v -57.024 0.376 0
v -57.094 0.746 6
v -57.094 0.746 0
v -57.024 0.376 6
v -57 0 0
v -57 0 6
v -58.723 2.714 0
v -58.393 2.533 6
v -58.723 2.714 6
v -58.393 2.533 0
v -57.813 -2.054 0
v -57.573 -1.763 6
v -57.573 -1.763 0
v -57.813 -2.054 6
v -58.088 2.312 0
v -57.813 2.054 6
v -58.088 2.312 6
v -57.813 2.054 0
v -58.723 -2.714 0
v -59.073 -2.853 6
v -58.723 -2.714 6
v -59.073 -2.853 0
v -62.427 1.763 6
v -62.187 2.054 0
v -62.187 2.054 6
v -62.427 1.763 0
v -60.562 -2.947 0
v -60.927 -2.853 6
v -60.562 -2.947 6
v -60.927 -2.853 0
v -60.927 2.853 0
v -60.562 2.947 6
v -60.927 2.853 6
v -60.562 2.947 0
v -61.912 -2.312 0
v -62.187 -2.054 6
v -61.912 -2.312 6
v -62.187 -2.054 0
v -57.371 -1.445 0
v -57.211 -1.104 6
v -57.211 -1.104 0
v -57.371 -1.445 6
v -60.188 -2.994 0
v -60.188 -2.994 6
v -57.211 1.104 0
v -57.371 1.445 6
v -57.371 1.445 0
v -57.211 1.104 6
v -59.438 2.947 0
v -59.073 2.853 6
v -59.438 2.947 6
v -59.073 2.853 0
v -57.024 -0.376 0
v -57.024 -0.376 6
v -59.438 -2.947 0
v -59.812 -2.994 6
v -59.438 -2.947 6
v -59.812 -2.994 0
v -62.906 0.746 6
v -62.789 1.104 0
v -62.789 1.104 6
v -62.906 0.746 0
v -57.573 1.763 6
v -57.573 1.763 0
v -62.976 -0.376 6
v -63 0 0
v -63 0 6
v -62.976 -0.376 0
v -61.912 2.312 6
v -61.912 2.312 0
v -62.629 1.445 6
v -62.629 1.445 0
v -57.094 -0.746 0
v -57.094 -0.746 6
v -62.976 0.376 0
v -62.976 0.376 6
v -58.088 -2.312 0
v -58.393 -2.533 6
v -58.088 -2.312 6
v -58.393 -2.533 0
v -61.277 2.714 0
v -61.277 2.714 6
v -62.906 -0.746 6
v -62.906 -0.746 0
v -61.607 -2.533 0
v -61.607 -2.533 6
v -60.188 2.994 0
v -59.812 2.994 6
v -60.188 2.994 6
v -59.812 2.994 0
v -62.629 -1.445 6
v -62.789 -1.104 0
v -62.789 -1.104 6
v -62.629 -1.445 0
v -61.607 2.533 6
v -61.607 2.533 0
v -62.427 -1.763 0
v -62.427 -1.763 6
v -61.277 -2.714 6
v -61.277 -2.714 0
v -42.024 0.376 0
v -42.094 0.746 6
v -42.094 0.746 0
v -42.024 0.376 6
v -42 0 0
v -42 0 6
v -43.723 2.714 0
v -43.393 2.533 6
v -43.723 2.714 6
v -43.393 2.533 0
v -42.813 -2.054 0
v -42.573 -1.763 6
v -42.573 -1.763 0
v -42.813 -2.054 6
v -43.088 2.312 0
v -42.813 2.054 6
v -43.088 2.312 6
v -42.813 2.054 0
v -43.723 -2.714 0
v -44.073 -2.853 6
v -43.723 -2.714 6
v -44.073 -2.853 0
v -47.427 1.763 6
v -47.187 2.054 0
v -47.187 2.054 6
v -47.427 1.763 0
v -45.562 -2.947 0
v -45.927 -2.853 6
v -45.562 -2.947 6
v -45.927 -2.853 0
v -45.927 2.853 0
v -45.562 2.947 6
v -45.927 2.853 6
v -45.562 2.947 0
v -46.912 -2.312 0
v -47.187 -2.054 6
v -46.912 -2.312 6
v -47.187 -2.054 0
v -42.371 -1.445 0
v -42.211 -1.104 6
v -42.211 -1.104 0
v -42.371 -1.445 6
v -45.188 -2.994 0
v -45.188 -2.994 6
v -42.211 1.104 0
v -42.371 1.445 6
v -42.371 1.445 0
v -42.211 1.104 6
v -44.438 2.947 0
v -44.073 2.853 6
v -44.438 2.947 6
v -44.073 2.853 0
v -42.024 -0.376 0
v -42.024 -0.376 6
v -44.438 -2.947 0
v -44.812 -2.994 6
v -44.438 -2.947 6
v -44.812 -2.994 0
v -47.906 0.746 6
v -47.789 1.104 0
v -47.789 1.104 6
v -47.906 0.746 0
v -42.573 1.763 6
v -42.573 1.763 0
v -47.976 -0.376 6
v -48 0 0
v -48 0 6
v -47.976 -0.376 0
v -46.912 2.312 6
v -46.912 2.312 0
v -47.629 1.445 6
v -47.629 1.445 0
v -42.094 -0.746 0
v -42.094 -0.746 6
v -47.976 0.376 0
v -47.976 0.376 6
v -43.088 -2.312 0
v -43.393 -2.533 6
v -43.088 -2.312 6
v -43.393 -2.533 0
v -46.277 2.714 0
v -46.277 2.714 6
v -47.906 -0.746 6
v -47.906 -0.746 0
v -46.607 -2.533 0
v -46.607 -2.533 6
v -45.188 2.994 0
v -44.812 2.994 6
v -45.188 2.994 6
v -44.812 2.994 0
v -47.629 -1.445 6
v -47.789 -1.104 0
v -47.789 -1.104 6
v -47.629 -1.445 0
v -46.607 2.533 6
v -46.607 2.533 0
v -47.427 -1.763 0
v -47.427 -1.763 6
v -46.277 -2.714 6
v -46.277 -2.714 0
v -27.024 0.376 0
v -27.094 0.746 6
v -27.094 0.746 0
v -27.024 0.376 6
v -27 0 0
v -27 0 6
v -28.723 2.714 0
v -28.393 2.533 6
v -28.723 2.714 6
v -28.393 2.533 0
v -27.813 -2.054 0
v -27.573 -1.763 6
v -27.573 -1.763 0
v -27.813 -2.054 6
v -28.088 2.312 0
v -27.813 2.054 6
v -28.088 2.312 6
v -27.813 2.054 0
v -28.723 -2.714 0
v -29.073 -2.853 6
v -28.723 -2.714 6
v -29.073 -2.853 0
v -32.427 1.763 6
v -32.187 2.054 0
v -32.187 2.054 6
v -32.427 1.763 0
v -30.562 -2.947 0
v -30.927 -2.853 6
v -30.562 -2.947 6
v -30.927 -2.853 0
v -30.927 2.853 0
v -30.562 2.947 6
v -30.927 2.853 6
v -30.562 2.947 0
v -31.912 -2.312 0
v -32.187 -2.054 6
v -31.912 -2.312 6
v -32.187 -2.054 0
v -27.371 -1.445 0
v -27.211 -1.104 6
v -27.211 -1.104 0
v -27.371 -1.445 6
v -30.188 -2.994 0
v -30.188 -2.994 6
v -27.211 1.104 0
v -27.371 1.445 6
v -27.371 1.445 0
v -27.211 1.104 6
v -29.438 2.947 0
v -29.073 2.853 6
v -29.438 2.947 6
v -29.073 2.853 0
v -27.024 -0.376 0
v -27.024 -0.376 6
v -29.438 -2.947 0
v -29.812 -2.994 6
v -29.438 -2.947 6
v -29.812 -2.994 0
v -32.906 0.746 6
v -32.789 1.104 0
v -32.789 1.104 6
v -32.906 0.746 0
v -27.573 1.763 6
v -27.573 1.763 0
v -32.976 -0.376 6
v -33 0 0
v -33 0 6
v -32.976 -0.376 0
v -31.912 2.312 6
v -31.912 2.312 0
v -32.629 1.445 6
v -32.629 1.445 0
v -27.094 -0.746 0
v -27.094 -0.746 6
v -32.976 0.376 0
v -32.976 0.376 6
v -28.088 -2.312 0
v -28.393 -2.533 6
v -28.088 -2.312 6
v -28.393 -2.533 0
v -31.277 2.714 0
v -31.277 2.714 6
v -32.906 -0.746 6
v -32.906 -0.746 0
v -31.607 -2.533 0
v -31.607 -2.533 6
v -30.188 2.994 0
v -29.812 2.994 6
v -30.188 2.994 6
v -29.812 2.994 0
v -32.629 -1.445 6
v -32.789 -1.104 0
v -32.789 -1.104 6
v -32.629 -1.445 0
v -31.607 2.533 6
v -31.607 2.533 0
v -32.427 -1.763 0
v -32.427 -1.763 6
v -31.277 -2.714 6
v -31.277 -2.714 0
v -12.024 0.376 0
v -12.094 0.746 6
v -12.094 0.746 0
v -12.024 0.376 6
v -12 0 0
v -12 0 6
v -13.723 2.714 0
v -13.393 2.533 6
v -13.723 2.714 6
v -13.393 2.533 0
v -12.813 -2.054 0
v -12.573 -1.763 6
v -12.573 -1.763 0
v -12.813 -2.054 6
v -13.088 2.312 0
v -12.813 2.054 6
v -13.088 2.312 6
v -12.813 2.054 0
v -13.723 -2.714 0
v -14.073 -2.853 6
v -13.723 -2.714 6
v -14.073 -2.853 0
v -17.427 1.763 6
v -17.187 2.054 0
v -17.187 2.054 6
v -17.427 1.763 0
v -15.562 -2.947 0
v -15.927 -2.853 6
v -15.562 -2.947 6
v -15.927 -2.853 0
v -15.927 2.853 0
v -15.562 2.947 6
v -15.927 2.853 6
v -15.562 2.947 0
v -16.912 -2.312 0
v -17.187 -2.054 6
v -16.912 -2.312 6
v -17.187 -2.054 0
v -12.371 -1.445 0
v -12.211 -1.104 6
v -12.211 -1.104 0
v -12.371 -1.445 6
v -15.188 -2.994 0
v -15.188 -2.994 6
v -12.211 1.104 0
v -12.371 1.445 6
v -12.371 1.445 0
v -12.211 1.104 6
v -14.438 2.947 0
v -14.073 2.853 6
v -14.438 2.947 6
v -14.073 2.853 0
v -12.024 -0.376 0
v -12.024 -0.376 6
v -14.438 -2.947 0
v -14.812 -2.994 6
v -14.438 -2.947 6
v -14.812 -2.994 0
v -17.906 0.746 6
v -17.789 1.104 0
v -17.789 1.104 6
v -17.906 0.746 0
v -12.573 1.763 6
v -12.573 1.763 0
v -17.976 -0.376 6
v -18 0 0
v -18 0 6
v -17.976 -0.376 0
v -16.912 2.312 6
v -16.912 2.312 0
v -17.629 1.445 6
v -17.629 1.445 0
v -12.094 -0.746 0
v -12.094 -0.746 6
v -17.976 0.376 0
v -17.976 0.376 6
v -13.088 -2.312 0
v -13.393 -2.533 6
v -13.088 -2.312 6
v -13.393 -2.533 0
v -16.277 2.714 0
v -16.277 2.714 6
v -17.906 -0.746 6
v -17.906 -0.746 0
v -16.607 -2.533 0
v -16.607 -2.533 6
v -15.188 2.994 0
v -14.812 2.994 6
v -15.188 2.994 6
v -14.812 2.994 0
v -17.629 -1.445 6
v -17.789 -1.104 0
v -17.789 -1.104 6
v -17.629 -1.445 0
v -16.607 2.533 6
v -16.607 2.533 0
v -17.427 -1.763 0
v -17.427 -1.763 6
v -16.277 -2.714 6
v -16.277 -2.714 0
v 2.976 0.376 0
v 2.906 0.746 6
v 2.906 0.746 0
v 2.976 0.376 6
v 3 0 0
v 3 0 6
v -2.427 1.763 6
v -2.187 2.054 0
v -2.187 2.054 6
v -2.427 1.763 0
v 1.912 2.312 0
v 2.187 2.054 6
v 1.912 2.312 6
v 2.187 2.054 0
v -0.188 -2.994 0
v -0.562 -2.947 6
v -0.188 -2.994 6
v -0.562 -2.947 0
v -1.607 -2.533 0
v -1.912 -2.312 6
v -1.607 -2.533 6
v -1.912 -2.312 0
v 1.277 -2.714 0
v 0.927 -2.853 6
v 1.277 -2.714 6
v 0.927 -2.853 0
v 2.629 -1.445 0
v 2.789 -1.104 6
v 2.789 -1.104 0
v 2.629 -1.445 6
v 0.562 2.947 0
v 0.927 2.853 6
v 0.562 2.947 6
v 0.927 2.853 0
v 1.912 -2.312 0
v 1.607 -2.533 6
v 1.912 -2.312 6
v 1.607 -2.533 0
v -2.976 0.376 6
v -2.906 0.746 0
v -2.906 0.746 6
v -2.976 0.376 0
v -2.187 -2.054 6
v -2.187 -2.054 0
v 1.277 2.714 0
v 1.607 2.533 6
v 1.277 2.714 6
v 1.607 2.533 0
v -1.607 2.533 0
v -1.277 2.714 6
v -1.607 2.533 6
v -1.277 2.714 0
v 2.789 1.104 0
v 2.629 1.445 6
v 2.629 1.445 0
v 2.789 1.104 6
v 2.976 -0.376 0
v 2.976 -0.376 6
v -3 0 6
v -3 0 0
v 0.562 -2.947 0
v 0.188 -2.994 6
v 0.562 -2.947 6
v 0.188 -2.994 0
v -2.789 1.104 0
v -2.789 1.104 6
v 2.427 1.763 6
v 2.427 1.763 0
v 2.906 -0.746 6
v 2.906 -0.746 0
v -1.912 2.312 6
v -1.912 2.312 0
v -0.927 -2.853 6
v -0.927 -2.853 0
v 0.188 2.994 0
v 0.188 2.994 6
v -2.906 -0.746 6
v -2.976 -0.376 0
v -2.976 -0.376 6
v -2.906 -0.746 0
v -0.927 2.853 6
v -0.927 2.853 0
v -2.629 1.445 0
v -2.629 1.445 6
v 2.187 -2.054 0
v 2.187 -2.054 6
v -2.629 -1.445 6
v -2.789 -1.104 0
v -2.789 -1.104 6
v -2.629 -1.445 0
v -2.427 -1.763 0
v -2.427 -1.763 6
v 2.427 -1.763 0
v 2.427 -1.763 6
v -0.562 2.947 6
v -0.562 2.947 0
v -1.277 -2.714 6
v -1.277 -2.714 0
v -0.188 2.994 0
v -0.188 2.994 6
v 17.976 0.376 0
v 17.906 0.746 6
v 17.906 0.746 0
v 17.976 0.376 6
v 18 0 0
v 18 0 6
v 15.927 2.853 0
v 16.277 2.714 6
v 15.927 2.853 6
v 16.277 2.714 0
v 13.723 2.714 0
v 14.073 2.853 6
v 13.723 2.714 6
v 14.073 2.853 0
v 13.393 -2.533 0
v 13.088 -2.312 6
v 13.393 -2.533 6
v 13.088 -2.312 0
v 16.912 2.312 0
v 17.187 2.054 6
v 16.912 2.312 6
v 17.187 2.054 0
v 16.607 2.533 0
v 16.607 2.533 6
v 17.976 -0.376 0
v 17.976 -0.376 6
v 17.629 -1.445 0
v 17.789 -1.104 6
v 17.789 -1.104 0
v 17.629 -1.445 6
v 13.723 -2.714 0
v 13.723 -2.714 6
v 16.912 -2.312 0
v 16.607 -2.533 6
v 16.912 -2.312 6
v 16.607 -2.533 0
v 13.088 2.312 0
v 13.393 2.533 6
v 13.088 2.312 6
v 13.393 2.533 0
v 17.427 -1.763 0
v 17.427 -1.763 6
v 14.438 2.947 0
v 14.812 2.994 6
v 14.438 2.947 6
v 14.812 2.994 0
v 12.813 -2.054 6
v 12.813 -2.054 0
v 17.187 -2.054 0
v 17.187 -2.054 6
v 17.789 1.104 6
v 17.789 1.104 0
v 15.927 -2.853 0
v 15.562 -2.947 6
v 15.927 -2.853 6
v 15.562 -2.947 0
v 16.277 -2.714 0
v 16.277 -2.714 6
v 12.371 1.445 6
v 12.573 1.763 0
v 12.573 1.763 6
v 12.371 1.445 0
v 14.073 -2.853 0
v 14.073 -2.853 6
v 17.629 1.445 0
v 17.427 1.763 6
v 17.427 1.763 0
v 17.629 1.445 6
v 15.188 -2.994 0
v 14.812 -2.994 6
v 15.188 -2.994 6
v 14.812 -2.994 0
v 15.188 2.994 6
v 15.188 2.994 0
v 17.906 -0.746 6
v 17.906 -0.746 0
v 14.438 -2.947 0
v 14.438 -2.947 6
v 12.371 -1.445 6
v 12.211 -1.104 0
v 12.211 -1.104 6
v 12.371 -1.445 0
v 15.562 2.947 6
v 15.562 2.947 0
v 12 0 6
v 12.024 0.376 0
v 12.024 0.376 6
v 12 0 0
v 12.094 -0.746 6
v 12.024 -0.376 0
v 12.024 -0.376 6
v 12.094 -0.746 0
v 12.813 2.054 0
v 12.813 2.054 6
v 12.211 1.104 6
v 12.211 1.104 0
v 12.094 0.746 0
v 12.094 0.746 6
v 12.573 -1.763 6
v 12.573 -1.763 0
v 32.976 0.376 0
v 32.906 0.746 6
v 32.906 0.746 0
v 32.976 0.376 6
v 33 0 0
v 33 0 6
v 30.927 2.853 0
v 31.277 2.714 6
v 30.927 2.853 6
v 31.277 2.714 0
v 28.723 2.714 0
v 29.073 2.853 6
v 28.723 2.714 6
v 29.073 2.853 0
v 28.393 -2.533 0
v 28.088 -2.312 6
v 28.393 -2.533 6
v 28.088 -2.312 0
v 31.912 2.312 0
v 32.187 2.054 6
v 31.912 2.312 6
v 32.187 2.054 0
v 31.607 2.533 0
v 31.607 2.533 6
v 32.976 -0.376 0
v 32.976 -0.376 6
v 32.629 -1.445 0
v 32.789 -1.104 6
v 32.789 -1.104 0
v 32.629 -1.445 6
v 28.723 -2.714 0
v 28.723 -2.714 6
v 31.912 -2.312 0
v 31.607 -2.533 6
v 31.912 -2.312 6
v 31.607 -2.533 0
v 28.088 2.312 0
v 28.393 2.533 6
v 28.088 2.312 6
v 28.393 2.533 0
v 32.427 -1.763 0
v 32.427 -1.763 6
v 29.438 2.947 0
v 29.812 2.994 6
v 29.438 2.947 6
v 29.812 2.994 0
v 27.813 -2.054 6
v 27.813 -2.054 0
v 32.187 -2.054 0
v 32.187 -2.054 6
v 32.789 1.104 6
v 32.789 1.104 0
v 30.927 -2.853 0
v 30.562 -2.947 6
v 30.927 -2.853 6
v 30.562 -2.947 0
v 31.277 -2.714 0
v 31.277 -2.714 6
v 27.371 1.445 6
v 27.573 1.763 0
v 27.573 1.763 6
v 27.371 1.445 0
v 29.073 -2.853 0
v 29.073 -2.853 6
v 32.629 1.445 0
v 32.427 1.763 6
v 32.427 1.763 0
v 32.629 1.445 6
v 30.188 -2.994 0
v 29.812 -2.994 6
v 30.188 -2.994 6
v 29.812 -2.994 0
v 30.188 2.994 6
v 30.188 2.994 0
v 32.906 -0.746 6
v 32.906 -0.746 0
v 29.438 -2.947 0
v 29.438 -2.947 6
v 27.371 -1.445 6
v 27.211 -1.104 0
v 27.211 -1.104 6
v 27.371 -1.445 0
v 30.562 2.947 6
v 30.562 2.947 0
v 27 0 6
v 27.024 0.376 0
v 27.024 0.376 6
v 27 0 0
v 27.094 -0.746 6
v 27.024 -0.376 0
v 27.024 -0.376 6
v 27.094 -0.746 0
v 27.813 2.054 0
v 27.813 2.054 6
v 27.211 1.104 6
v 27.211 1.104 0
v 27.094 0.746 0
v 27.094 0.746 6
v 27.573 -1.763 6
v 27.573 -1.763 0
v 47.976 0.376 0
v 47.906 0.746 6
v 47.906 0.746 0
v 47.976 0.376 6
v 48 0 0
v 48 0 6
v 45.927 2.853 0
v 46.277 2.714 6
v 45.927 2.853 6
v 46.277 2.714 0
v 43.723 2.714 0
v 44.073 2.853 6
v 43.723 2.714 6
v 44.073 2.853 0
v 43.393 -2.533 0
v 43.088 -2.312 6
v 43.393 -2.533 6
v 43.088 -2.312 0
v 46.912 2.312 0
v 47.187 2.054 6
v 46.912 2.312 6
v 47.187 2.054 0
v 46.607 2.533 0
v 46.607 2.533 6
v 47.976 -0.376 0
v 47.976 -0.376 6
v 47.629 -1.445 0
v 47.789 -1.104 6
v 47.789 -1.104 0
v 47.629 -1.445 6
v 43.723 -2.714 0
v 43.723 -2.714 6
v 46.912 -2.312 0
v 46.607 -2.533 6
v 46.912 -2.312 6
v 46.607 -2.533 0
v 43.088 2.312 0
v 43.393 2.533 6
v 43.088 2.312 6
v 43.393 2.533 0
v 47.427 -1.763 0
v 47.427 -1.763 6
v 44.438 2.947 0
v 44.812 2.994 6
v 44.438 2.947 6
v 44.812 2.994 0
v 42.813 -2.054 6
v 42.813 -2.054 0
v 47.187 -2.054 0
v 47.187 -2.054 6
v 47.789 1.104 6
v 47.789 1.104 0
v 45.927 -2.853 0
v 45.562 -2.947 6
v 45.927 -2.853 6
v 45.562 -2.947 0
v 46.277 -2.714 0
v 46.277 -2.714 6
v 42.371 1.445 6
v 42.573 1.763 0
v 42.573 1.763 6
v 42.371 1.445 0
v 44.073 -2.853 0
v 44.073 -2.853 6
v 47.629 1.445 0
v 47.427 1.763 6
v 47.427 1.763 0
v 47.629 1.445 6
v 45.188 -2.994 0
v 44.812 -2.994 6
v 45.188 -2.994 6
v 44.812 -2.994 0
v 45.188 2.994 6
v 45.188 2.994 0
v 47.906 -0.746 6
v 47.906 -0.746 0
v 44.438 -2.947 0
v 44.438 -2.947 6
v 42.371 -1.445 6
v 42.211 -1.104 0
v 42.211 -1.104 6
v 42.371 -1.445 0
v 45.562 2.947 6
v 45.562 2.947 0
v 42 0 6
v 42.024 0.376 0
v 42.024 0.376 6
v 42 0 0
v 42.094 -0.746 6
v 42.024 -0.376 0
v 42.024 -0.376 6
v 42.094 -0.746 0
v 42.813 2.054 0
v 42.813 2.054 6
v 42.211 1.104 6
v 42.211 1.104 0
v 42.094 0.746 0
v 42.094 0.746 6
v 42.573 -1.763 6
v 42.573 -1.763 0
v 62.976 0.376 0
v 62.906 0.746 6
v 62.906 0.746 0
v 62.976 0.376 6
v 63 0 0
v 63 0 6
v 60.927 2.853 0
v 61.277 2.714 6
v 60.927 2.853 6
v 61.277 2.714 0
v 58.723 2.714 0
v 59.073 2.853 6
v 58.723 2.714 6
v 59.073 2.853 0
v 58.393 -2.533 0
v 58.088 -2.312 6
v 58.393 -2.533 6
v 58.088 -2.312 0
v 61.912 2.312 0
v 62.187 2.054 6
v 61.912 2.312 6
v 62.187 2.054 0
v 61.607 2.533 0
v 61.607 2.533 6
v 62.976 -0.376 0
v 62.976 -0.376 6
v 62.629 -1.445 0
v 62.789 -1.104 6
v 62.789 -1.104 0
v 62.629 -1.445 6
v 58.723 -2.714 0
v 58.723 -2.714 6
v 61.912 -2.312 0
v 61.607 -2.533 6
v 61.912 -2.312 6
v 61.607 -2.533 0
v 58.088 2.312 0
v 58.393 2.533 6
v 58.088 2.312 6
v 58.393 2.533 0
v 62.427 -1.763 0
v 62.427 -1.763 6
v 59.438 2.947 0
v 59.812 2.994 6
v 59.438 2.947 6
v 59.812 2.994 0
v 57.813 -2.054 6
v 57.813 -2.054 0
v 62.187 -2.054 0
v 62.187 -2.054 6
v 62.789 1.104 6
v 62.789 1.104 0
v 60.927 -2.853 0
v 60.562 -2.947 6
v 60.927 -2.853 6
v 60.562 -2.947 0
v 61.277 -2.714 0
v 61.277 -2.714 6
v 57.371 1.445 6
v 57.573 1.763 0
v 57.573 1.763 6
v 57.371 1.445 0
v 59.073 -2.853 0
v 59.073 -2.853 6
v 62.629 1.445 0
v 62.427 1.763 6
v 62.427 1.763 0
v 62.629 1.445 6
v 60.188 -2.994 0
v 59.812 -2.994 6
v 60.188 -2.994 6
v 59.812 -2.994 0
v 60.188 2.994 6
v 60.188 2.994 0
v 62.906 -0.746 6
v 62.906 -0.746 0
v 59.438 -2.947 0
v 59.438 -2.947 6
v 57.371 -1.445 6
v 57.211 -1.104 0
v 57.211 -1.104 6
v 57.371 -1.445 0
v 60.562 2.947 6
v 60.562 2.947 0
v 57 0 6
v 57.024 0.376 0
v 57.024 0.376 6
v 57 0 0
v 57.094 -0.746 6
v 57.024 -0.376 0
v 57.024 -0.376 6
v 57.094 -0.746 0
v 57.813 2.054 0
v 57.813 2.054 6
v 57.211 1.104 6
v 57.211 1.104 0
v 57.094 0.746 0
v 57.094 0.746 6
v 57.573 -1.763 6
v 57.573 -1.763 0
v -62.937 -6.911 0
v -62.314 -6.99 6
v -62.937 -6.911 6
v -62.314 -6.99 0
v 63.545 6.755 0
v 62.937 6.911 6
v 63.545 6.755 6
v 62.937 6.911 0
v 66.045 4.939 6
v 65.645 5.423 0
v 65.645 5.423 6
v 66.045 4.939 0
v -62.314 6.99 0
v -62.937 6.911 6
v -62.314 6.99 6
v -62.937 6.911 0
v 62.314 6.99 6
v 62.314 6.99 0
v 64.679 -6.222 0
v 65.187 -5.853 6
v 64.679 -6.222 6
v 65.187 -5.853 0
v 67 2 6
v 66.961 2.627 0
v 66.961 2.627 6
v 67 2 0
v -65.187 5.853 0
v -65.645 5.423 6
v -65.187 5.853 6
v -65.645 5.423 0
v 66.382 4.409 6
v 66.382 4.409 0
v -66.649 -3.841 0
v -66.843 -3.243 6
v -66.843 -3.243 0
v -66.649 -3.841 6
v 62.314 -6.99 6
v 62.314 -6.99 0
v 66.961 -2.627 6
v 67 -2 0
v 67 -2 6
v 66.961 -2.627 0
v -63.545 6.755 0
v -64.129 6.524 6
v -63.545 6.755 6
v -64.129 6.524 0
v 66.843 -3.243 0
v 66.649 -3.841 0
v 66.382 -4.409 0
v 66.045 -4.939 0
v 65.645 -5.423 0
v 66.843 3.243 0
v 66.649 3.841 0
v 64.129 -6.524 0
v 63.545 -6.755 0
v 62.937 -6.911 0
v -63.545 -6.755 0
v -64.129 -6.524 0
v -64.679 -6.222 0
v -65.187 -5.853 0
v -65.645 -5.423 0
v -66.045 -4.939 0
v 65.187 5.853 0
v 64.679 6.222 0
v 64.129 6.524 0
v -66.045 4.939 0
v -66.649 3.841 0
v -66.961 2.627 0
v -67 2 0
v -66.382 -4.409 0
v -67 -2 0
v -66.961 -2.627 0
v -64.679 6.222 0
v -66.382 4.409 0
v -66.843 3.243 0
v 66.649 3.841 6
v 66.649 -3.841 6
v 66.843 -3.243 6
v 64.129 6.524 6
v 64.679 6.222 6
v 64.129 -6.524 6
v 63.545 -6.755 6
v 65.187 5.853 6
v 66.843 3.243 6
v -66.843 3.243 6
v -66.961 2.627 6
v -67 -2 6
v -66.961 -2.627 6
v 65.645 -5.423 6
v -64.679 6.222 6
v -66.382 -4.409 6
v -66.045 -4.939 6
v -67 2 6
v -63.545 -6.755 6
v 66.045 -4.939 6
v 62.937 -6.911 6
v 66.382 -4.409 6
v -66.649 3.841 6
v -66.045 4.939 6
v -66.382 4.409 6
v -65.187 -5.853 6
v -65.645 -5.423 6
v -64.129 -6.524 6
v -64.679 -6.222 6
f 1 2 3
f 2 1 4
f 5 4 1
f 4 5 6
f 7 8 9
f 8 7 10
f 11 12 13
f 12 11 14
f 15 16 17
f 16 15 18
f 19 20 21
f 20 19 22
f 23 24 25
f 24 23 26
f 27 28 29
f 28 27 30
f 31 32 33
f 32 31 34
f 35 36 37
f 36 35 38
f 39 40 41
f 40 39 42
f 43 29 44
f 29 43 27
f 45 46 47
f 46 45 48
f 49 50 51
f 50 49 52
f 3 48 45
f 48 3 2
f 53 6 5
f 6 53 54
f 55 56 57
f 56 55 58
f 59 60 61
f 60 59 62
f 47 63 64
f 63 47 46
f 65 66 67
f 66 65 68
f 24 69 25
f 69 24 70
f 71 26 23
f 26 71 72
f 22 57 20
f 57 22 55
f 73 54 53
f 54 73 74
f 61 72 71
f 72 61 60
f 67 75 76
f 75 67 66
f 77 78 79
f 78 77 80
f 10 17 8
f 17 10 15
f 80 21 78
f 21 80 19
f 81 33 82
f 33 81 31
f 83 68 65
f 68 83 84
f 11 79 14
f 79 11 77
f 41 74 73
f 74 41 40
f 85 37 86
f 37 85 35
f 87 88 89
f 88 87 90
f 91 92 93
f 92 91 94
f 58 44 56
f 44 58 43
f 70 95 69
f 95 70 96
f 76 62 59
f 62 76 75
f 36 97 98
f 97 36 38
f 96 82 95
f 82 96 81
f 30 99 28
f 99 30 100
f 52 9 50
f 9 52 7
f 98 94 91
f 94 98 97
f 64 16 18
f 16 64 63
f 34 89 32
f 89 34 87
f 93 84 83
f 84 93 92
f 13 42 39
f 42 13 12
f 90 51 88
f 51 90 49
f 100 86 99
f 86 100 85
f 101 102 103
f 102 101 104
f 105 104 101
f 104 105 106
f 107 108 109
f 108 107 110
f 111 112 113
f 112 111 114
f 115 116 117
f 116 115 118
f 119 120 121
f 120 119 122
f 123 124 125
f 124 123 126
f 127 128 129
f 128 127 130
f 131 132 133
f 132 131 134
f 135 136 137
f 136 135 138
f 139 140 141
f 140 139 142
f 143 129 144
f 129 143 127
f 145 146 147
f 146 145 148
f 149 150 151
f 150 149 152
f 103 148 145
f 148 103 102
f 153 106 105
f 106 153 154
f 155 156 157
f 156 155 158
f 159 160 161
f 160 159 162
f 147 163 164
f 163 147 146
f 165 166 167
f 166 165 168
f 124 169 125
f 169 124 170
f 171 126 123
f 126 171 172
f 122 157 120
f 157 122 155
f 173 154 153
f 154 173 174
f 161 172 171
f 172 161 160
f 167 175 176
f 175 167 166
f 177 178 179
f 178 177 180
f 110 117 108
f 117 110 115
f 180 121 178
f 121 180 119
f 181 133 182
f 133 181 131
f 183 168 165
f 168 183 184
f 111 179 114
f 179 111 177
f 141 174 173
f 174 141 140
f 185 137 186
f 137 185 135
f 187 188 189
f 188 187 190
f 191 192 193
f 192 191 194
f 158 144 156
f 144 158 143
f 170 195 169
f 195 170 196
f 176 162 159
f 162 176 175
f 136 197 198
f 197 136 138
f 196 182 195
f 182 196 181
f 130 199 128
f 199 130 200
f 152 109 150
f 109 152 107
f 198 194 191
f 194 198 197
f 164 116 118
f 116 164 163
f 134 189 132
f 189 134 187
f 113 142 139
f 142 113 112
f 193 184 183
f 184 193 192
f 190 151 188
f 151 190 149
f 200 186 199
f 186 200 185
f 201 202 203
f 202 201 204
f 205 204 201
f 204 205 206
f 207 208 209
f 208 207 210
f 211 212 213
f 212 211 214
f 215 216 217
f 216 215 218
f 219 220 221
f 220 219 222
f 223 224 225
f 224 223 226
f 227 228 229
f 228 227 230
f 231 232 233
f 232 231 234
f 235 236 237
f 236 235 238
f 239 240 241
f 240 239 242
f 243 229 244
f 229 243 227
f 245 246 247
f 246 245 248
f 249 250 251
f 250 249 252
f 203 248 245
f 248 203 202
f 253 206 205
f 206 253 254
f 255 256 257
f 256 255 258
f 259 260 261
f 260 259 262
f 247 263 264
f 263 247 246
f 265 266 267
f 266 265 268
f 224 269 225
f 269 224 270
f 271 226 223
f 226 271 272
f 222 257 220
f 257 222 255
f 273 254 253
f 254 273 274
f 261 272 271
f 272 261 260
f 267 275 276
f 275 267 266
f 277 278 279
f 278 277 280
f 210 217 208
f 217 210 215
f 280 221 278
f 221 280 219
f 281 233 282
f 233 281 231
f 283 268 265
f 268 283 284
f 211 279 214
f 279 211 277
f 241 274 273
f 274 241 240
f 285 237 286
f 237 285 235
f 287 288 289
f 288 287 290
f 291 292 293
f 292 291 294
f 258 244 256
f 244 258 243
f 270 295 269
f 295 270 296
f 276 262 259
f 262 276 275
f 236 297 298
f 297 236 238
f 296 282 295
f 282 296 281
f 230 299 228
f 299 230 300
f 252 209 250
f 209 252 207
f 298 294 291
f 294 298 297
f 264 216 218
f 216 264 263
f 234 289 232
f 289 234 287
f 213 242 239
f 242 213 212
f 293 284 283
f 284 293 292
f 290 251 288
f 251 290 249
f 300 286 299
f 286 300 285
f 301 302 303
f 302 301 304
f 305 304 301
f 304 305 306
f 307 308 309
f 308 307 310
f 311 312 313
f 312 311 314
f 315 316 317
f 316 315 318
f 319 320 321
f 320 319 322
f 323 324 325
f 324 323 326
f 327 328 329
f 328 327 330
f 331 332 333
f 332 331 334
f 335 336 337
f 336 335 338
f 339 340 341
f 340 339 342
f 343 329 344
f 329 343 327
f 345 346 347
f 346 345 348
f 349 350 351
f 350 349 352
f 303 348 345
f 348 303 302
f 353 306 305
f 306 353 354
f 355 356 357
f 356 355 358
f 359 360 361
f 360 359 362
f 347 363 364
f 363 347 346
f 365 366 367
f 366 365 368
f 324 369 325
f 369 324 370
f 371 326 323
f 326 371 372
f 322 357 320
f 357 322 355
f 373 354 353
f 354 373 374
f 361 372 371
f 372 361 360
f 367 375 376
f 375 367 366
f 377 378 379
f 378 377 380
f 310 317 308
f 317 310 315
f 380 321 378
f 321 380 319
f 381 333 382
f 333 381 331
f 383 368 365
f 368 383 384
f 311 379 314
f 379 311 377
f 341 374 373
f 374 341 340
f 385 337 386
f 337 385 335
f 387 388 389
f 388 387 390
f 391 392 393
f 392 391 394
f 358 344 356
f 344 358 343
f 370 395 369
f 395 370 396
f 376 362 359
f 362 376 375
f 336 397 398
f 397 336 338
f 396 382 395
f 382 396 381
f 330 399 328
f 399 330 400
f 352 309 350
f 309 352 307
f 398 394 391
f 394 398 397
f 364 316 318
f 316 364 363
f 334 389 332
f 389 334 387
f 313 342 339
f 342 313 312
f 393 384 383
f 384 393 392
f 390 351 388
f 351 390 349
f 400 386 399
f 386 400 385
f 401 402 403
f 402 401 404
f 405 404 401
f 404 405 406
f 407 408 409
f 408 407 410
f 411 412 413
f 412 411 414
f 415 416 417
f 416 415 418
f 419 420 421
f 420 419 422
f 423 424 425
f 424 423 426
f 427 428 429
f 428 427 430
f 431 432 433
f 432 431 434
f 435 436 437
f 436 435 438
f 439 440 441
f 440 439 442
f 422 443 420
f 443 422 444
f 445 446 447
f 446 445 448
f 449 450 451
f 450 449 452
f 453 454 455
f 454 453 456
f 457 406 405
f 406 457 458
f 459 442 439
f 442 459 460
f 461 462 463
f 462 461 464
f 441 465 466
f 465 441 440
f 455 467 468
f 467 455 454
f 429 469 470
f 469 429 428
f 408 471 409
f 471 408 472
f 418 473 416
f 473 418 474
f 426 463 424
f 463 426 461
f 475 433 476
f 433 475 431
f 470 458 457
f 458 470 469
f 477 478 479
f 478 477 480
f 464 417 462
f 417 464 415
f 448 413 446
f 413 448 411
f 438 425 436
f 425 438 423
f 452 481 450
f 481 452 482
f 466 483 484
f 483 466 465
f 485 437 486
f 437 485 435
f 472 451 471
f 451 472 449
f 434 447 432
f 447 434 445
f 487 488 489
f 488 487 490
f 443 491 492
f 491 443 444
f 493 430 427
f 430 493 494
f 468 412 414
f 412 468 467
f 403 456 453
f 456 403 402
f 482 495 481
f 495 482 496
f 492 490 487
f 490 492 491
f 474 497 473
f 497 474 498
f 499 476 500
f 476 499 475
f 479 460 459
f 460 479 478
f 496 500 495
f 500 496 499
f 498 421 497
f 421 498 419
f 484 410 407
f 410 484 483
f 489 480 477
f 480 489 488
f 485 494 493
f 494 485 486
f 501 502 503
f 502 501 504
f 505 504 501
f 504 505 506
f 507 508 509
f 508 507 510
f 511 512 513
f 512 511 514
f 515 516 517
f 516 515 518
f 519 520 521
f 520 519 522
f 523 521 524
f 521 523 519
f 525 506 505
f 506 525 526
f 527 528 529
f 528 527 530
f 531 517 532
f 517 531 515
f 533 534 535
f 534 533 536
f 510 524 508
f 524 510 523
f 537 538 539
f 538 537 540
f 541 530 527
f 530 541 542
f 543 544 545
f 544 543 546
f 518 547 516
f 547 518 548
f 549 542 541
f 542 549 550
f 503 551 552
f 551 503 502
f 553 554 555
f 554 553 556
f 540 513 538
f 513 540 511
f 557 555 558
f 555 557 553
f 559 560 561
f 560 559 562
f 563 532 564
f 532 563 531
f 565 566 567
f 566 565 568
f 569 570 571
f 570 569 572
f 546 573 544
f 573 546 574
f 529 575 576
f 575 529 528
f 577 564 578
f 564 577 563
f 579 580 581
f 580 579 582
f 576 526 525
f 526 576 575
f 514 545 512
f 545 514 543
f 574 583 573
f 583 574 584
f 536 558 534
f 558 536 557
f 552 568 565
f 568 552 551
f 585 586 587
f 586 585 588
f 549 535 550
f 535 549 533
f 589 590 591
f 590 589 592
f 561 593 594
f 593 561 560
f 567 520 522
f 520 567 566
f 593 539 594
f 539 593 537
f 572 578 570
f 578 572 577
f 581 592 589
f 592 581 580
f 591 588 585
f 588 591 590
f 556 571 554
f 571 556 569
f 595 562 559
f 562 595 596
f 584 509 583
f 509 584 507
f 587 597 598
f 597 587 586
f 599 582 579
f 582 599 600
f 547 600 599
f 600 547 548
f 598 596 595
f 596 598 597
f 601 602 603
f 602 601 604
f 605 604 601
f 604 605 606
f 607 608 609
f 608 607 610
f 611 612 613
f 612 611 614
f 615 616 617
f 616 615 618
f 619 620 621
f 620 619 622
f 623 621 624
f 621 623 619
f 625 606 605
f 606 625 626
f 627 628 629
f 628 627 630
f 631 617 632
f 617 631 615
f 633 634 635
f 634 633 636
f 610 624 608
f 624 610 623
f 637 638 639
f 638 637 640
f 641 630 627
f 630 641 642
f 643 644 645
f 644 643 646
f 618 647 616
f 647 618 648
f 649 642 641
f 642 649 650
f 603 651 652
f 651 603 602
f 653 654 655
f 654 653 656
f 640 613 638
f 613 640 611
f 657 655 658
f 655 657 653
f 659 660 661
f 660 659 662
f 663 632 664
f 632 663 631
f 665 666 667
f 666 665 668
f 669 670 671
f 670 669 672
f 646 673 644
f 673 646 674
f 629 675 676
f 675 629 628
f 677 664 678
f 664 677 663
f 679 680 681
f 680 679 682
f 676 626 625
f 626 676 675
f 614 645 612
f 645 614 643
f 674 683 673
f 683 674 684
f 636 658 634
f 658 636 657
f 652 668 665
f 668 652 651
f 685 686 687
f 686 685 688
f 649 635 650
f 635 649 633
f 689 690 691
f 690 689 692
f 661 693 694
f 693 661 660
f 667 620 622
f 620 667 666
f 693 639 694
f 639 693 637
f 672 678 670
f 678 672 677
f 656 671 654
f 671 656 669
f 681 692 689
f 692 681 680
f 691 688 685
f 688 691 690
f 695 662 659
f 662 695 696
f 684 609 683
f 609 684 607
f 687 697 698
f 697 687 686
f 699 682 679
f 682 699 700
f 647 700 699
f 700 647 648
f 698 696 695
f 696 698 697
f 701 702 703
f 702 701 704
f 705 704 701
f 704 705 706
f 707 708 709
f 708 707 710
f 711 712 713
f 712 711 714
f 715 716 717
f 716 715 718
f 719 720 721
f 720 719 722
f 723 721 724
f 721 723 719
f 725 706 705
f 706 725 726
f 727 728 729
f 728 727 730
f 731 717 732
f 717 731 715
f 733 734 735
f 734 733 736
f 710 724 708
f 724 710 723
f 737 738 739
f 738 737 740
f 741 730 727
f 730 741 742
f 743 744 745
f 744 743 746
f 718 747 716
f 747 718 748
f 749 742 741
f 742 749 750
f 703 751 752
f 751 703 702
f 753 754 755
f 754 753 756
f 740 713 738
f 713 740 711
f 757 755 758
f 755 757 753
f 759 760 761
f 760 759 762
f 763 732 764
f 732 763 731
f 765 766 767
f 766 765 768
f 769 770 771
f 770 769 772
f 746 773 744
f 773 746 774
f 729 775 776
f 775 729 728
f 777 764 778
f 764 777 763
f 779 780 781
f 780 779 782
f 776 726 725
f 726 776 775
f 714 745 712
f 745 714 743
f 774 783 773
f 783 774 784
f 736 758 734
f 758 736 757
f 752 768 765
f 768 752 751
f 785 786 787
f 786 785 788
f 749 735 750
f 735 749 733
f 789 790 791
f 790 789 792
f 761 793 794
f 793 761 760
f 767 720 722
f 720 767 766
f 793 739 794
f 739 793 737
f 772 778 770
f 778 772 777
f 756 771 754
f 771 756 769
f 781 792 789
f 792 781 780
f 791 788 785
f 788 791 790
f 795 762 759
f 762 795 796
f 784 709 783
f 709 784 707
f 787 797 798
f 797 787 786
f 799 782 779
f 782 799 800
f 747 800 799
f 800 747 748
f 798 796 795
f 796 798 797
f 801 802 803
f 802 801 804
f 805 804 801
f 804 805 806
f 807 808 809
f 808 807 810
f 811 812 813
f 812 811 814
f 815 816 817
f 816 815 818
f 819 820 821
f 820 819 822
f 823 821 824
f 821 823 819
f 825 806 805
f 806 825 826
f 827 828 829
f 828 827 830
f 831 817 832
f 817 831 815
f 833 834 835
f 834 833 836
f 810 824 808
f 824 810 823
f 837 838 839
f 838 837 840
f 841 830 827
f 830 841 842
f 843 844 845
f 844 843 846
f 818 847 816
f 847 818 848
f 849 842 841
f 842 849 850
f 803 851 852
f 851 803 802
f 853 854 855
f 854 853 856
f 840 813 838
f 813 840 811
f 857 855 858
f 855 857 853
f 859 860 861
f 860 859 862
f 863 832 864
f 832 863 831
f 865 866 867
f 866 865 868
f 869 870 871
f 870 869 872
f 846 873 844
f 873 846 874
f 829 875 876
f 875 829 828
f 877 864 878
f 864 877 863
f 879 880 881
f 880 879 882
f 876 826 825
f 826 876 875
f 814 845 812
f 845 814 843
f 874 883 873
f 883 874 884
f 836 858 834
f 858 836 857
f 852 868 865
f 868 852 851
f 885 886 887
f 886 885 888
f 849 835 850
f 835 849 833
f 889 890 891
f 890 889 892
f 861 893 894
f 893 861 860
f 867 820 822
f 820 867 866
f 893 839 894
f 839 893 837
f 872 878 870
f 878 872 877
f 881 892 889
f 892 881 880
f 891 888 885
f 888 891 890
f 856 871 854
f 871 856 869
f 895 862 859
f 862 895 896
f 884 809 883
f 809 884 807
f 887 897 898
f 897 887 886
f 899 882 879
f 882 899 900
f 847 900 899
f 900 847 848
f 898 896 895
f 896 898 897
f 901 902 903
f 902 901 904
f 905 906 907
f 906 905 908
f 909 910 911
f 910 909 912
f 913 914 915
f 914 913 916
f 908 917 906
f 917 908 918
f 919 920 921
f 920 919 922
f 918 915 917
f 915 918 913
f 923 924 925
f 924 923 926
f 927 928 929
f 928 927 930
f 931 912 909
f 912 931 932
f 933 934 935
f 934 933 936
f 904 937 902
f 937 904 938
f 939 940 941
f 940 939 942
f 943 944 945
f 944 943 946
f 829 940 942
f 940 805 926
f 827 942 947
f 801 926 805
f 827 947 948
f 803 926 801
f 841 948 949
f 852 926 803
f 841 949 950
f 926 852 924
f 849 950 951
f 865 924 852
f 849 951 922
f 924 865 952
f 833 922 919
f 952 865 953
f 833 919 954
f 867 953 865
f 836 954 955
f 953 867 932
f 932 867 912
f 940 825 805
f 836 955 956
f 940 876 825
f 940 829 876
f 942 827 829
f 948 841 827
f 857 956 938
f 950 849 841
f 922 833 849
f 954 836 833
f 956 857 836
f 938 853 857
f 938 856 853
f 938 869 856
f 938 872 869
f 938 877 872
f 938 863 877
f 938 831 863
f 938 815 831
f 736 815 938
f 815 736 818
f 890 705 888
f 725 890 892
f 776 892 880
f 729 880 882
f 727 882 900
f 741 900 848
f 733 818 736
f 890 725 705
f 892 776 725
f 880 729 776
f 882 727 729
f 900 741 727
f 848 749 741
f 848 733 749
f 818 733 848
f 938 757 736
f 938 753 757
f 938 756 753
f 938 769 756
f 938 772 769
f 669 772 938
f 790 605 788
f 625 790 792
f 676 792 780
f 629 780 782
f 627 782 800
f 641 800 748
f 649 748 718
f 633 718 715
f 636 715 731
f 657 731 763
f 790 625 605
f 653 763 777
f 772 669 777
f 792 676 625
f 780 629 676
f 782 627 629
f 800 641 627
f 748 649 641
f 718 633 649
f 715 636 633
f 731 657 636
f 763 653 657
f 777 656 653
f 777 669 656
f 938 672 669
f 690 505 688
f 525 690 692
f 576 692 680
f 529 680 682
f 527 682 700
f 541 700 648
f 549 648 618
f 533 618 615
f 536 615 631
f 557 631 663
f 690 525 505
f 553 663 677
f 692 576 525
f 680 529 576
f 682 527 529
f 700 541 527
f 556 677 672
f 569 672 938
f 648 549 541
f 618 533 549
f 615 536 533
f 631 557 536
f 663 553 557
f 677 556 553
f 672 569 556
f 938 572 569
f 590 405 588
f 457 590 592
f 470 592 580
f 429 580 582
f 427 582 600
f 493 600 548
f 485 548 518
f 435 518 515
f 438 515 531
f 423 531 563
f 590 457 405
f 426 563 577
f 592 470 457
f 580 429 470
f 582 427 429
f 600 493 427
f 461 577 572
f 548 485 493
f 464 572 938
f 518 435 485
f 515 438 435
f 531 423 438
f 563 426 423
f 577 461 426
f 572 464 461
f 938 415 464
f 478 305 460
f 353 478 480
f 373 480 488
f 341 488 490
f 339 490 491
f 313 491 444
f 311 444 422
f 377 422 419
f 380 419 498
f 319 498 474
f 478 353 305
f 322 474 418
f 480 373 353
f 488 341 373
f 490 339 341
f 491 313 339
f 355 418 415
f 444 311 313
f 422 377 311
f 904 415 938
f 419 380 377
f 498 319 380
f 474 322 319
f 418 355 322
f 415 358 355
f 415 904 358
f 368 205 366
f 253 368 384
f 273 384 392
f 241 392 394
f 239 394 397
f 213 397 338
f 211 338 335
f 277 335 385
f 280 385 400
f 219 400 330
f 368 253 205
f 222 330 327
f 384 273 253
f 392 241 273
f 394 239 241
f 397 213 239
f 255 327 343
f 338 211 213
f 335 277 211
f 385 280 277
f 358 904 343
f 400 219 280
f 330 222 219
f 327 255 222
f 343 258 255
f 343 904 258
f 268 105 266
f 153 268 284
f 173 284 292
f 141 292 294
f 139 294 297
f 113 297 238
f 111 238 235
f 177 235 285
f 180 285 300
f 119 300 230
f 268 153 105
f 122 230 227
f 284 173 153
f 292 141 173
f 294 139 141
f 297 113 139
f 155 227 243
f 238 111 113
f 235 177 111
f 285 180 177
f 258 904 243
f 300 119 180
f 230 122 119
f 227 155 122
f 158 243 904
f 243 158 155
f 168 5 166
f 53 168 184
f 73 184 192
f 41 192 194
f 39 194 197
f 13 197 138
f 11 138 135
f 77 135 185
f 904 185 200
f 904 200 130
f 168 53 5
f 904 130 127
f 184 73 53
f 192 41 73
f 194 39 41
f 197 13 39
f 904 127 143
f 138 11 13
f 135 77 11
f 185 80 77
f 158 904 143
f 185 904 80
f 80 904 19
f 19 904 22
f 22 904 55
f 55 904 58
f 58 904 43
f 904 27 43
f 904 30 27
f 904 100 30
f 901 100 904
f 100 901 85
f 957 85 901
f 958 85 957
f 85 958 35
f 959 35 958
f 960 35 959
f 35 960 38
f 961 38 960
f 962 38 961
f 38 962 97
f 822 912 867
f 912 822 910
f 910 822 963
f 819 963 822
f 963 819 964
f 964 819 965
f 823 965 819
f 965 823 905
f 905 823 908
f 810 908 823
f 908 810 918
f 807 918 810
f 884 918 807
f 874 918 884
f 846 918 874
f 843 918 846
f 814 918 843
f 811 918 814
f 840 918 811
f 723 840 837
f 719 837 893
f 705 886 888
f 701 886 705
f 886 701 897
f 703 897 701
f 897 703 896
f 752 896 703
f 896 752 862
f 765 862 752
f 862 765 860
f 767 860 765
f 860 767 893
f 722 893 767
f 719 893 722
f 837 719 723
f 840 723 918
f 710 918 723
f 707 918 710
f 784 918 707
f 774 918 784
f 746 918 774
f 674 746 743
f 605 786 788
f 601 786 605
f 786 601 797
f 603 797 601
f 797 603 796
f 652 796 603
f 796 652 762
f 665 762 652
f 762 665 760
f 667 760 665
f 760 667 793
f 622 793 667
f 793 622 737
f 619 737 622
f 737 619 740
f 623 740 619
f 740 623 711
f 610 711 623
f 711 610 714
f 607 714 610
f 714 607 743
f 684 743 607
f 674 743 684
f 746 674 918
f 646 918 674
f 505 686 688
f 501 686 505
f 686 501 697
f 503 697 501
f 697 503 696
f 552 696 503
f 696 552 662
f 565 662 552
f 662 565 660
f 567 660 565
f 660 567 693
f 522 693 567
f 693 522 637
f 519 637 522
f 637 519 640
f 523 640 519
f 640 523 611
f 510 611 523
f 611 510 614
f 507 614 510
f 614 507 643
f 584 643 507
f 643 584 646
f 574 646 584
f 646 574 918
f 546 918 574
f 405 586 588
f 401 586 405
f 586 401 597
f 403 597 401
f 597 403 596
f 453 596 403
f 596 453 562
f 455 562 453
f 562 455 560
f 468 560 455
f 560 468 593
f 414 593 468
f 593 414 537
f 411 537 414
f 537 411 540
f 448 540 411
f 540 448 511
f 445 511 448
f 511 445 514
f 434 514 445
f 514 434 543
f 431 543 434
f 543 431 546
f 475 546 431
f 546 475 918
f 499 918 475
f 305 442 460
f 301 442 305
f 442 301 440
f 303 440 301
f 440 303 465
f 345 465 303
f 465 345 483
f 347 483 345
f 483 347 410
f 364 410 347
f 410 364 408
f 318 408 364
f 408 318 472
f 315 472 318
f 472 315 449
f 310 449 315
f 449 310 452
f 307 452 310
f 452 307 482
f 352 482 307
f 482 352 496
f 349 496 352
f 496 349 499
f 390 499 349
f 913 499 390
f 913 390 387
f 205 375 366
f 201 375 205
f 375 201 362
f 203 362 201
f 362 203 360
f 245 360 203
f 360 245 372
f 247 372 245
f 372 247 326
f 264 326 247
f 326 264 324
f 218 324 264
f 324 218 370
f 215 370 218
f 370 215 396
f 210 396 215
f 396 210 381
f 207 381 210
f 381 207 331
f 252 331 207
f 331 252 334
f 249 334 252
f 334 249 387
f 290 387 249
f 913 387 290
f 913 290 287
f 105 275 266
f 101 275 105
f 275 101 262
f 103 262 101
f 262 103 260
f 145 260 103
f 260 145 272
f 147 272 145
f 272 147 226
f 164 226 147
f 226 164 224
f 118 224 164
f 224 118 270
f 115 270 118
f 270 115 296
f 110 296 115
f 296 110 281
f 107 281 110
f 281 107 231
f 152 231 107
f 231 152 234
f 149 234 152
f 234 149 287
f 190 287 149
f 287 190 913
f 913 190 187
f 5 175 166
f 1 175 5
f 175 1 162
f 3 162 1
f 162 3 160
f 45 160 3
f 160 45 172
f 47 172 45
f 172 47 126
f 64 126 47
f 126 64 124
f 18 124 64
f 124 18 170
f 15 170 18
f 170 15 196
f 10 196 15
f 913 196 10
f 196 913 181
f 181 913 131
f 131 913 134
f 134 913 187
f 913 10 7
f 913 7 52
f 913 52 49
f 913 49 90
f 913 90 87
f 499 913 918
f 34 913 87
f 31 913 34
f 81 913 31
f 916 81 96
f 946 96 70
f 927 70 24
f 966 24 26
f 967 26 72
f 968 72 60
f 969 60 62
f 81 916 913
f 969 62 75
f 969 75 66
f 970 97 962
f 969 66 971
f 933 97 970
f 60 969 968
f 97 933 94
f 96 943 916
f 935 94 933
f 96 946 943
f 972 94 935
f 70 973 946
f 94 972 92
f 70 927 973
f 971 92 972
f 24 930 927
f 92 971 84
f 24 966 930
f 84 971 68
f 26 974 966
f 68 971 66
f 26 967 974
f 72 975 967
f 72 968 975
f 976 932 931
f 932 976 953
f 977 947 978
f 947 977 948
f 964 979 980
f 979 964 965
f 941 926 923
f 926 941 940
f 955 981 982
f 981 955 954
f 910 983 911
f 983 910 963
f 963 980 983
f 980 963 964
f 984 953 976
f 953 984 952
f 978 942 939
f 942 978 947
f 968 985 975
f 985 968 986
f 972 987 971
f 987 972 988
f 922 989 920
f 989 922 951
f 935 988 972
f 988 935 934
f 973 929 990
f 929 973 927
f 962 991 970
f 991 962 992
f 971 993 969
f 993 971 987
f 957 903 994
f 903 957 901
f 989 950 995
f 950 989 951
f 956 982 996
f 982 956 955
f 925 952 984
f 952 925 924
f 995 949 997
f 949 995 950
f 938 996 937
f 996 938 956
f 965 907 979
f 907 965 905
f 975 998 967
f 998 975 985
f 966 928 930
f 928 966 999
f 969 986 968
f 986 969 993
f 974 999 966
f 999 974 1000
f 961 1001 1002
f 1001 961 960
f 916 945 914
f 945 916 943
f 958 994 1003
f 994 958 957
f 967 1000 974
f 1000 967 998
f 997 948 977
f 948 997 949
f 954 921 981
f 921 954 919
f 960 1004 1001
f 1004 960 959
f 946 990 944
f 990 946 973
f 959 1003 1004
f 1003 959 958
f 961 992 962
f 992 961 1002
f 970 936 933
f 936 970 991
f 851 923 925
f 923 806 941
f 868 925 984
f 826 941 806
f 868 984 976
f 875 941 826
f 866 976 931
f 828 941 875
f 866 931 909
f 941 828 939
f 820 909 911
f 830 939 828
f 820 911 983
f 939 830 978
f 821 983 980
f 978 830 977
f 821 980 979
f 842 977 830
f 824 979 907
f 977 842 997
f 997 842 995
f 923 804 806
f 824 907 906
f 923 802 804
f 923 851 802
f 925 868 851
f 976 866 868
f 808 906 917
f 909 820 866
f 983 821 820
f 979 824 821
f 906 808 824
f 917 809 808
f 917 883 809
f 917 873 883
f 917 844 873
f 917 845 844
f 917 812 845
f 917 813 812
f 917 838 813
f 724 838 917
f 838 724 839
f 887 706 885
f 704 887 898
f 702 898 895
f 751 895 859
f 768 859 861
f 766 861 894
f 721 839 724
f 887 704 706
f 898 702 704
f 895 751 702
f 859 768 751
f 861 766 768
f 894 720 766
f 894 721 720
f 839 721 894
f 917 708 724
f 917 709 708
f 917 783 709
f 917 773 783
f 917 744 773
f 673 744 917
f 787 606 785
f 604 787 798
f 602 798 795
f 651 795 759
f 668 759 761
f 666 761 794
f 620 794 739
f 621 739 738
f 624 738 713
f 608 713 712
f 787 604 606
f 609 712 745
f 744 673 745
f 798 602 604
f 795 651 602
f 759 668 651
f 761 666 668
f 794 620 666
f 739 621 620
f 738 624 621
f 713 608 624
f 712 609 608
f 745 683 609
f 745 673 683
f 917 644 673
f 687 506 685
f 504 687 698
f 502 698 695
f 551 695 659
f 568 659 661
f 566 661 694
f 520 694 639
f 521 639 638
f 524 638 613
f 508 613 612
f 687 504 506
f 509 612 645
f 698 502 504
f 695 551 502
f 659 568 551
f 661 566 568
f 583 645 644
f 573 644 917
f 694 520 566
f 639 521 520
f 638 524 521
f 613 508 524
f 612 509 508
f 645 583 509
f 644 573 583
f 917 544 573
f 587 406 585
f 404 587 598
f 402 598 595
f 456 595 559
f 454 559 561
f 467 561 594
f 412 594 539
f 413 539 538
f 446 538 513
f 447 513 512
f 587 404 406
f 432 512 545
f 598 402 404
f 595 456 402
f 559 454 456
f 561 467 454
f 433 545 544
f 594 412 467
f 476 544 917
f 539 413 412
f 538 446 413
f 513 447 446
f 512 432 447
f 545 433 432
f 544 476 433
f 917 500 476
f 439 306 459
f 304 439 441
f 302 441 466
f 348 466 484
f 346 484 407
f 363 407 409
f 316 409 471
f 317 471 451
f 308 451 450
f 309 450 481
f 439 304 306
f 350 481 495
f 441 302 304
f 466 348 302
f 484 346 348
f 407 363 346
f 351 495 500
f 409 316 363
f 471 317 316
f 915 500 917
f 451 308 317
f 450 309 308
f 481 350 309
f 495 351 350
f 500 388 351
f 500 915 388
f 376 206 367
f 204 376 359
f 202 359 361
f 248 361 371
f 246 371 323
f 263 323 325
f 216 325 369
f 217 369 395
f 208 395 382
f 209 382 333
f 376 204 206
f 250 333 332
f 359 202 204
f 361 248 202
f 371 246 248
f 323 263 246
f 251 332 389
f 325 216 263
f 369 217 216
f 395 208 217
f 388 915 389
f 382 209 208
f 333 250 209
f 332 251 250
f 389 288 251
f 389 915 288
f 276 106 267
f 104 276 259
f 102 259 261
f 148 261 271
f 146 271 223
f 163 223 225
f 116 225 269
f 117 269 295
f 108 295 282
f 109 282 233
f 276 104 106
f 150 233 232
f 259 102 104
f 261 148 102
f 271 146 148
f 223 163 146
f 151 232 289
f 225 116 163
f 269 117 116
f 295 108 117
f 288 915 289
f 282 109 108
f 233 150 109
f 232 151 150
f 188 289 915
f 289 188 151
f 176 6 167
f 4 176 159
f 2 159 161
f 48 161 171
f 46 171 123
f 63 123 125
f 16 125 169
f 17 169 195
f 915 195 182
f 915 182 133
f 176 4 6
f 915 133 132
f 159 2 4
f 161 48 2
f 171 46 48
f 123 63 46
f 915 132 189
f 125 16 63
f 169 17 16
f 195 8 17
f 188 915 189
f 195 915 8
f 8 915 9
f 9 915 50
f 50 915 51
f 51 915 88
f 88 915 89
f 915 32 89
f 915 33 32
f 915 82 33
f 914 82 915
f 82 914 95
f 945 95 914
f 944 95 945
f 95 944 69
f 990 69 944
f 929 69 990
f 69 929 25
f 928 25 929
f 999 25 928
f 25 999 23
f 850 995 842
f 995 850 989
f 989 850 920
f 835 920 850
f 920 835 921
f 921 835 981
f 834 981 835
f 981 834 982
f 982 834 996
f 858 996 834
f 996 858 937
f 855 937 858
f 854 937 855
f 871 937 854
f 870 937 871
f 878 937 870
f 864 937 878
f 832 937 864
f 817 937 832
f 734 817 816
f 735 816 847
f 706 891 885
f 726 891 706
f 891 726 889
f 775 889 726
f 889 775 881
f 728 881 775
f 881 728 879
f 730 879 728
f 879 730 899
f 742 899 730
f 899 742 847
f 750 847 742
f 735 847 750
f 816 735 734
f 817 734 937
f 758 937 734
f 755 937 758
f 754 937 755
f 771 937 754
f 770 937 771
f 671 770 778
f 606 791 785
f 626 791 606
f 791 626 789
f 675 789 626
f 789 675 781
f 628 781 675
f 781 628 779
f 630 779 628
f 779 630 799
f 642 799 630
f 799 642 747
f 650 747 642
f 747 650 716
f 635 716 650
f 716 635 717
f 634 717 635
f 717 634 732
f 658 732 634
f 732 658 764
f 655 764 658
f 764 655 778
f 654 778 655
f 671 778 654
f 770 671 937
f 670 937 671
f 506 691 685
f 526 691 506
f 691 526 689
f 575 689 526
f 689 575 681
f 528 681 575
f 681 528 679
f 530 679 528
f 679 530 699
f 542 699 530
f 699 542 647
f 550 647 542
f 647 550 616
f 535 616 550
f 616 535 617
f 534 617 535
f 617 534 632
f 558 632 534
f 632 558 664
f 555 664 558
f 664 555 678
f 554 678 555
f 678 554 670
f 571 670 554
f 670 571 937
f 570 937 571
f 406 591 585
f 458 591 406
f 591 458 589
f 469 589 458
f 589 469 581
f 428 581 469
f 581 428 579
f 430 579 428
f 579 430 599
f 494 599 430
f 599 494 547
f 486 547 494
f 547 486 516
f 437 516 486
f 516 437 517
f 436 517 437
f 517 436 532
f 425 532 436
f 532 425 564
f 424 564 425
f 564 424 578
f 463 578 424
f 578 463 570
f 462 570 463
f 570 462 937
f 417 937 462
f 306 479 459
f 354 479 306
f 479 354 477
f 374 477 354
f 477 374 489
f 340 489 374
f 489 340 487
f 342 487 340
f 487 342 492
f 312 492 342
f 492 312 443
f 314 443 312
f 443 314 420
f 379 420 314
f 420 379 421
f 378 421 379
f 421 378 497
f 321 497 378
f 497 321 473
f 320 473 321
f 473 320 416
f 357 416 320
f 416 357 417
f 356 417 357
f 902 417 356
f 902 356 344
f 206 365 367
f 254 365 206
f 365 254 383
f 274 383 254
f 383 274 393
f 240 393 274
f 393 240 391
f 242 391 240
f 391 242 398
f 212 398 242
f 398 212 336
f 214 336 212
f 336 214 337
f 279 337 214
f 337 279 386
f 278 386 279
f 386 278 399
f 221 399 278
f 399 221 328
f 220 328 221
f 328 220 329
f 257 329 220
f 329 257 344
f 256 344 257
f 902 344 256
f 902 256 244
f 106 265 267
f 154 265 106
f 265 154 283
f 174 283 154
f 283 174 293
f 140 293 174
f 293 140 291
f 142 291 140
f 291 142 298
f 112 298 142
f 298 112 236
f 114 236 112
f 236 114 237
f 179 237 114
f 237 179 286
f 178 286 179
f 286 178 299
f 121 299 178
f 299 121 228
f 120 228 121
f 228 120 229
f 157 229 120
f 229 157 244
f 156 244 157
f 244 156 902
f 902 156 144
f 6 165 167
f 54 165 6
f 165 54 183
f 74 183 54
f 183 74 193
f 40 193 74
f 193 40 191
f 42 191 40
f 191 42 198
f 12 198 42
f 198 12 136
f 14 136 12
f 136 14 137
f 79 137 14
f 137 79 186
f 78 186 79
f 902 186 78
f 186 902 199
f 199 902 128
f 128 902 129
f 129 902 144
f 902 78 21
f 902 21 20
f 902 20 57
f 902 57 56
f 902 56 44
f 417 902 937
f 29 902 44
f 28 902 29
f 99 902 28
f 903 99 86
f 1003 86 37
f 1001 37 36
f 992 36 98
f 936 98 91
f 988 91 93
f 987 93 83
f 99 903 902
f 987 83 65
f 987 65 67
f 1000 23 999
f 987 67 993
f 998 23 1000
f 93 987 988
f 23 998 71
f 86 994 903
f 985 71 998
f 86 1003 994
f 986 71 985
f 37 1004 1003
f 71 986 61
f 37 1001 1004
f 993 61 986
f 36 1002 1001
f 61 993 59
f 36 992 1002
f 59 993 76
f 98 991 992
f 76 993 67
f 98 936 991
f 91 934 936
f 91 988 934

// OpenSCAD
$fn = 50;


difference() {
	union() {
		hull() {
			translate(v = [-62.0000000000, 2.0000000000, 0]) {
				cylinder(h = 6, r = 5);
			}
			translate(v = [62.0000000000, 2.0000000000, 0]) {
				cylinder(h = 6, r = 5);
			}
			translate(v = [-62.0000000000, -2.0000000000, 0]) {
				cylinder(h = 6, r = 5);
			}
			translate(v = [62.0000000000, -2.0000000000, 0]) {
				cylinder(h = 6, r = 5);
			}
		}
	}
	union() {
		translate(v = [-60.0000000000, 0.0000000000, 0]) {
			translate(v = [0, 0, -100]) {
				cylinder(h = 200, r = 3.0000000000);
			}
		}
		translate(v = [-45.0000000000, 0.0000000000, 0]) {
			translate(v = [0, 0, -100]) {
				cylinder(h = 200, r = 3.0000000000);
			}
		}
		translate(v = [-30.0000000000, 0.0000000000, 0]) {
			translate(v = [0, 0, -100]) {
				cylinder(h = 200, r = 3.0000000000);
			}
		}
		translate(v = [-15.0000000000, 0.0000000000, 0]) {
			translate(v = [0, 0, -100]) {
				cylinder(h = 200, r = 3.0000000000);
			}
		}
		translate(v = [0, 0, -100]) {
			cylinder(h = 200, r = 3.0000000000);
		}
		translate(v = [15.0000000000, 0.0000000000, 0]) {
			translate(v = [0, 0, -100]) {
				cylinder(h = 200, r = 3.0000000000);
			}
		}
		translate(v = [30.0000000000, 0.0000000000, 0]) {
			translate(v = [0, 0, -100]) {
				cylinder(h = 200, r = 3.0000000000);
			}
		}
		translate(v = [45.0000000000, 0.0000000000, 0]) {
			translate(v = [0, 0, -100]) {
				cylinder(h = 200, r = 3.0000000000);
			}
		}
		translate(v = [60.0000000000, 0.0000000000, 0]) {
			translate(v = [0, 0, -100]) {
				cylinder(h = 200, r = 3.0000000000);
			}
		}
	}
}
